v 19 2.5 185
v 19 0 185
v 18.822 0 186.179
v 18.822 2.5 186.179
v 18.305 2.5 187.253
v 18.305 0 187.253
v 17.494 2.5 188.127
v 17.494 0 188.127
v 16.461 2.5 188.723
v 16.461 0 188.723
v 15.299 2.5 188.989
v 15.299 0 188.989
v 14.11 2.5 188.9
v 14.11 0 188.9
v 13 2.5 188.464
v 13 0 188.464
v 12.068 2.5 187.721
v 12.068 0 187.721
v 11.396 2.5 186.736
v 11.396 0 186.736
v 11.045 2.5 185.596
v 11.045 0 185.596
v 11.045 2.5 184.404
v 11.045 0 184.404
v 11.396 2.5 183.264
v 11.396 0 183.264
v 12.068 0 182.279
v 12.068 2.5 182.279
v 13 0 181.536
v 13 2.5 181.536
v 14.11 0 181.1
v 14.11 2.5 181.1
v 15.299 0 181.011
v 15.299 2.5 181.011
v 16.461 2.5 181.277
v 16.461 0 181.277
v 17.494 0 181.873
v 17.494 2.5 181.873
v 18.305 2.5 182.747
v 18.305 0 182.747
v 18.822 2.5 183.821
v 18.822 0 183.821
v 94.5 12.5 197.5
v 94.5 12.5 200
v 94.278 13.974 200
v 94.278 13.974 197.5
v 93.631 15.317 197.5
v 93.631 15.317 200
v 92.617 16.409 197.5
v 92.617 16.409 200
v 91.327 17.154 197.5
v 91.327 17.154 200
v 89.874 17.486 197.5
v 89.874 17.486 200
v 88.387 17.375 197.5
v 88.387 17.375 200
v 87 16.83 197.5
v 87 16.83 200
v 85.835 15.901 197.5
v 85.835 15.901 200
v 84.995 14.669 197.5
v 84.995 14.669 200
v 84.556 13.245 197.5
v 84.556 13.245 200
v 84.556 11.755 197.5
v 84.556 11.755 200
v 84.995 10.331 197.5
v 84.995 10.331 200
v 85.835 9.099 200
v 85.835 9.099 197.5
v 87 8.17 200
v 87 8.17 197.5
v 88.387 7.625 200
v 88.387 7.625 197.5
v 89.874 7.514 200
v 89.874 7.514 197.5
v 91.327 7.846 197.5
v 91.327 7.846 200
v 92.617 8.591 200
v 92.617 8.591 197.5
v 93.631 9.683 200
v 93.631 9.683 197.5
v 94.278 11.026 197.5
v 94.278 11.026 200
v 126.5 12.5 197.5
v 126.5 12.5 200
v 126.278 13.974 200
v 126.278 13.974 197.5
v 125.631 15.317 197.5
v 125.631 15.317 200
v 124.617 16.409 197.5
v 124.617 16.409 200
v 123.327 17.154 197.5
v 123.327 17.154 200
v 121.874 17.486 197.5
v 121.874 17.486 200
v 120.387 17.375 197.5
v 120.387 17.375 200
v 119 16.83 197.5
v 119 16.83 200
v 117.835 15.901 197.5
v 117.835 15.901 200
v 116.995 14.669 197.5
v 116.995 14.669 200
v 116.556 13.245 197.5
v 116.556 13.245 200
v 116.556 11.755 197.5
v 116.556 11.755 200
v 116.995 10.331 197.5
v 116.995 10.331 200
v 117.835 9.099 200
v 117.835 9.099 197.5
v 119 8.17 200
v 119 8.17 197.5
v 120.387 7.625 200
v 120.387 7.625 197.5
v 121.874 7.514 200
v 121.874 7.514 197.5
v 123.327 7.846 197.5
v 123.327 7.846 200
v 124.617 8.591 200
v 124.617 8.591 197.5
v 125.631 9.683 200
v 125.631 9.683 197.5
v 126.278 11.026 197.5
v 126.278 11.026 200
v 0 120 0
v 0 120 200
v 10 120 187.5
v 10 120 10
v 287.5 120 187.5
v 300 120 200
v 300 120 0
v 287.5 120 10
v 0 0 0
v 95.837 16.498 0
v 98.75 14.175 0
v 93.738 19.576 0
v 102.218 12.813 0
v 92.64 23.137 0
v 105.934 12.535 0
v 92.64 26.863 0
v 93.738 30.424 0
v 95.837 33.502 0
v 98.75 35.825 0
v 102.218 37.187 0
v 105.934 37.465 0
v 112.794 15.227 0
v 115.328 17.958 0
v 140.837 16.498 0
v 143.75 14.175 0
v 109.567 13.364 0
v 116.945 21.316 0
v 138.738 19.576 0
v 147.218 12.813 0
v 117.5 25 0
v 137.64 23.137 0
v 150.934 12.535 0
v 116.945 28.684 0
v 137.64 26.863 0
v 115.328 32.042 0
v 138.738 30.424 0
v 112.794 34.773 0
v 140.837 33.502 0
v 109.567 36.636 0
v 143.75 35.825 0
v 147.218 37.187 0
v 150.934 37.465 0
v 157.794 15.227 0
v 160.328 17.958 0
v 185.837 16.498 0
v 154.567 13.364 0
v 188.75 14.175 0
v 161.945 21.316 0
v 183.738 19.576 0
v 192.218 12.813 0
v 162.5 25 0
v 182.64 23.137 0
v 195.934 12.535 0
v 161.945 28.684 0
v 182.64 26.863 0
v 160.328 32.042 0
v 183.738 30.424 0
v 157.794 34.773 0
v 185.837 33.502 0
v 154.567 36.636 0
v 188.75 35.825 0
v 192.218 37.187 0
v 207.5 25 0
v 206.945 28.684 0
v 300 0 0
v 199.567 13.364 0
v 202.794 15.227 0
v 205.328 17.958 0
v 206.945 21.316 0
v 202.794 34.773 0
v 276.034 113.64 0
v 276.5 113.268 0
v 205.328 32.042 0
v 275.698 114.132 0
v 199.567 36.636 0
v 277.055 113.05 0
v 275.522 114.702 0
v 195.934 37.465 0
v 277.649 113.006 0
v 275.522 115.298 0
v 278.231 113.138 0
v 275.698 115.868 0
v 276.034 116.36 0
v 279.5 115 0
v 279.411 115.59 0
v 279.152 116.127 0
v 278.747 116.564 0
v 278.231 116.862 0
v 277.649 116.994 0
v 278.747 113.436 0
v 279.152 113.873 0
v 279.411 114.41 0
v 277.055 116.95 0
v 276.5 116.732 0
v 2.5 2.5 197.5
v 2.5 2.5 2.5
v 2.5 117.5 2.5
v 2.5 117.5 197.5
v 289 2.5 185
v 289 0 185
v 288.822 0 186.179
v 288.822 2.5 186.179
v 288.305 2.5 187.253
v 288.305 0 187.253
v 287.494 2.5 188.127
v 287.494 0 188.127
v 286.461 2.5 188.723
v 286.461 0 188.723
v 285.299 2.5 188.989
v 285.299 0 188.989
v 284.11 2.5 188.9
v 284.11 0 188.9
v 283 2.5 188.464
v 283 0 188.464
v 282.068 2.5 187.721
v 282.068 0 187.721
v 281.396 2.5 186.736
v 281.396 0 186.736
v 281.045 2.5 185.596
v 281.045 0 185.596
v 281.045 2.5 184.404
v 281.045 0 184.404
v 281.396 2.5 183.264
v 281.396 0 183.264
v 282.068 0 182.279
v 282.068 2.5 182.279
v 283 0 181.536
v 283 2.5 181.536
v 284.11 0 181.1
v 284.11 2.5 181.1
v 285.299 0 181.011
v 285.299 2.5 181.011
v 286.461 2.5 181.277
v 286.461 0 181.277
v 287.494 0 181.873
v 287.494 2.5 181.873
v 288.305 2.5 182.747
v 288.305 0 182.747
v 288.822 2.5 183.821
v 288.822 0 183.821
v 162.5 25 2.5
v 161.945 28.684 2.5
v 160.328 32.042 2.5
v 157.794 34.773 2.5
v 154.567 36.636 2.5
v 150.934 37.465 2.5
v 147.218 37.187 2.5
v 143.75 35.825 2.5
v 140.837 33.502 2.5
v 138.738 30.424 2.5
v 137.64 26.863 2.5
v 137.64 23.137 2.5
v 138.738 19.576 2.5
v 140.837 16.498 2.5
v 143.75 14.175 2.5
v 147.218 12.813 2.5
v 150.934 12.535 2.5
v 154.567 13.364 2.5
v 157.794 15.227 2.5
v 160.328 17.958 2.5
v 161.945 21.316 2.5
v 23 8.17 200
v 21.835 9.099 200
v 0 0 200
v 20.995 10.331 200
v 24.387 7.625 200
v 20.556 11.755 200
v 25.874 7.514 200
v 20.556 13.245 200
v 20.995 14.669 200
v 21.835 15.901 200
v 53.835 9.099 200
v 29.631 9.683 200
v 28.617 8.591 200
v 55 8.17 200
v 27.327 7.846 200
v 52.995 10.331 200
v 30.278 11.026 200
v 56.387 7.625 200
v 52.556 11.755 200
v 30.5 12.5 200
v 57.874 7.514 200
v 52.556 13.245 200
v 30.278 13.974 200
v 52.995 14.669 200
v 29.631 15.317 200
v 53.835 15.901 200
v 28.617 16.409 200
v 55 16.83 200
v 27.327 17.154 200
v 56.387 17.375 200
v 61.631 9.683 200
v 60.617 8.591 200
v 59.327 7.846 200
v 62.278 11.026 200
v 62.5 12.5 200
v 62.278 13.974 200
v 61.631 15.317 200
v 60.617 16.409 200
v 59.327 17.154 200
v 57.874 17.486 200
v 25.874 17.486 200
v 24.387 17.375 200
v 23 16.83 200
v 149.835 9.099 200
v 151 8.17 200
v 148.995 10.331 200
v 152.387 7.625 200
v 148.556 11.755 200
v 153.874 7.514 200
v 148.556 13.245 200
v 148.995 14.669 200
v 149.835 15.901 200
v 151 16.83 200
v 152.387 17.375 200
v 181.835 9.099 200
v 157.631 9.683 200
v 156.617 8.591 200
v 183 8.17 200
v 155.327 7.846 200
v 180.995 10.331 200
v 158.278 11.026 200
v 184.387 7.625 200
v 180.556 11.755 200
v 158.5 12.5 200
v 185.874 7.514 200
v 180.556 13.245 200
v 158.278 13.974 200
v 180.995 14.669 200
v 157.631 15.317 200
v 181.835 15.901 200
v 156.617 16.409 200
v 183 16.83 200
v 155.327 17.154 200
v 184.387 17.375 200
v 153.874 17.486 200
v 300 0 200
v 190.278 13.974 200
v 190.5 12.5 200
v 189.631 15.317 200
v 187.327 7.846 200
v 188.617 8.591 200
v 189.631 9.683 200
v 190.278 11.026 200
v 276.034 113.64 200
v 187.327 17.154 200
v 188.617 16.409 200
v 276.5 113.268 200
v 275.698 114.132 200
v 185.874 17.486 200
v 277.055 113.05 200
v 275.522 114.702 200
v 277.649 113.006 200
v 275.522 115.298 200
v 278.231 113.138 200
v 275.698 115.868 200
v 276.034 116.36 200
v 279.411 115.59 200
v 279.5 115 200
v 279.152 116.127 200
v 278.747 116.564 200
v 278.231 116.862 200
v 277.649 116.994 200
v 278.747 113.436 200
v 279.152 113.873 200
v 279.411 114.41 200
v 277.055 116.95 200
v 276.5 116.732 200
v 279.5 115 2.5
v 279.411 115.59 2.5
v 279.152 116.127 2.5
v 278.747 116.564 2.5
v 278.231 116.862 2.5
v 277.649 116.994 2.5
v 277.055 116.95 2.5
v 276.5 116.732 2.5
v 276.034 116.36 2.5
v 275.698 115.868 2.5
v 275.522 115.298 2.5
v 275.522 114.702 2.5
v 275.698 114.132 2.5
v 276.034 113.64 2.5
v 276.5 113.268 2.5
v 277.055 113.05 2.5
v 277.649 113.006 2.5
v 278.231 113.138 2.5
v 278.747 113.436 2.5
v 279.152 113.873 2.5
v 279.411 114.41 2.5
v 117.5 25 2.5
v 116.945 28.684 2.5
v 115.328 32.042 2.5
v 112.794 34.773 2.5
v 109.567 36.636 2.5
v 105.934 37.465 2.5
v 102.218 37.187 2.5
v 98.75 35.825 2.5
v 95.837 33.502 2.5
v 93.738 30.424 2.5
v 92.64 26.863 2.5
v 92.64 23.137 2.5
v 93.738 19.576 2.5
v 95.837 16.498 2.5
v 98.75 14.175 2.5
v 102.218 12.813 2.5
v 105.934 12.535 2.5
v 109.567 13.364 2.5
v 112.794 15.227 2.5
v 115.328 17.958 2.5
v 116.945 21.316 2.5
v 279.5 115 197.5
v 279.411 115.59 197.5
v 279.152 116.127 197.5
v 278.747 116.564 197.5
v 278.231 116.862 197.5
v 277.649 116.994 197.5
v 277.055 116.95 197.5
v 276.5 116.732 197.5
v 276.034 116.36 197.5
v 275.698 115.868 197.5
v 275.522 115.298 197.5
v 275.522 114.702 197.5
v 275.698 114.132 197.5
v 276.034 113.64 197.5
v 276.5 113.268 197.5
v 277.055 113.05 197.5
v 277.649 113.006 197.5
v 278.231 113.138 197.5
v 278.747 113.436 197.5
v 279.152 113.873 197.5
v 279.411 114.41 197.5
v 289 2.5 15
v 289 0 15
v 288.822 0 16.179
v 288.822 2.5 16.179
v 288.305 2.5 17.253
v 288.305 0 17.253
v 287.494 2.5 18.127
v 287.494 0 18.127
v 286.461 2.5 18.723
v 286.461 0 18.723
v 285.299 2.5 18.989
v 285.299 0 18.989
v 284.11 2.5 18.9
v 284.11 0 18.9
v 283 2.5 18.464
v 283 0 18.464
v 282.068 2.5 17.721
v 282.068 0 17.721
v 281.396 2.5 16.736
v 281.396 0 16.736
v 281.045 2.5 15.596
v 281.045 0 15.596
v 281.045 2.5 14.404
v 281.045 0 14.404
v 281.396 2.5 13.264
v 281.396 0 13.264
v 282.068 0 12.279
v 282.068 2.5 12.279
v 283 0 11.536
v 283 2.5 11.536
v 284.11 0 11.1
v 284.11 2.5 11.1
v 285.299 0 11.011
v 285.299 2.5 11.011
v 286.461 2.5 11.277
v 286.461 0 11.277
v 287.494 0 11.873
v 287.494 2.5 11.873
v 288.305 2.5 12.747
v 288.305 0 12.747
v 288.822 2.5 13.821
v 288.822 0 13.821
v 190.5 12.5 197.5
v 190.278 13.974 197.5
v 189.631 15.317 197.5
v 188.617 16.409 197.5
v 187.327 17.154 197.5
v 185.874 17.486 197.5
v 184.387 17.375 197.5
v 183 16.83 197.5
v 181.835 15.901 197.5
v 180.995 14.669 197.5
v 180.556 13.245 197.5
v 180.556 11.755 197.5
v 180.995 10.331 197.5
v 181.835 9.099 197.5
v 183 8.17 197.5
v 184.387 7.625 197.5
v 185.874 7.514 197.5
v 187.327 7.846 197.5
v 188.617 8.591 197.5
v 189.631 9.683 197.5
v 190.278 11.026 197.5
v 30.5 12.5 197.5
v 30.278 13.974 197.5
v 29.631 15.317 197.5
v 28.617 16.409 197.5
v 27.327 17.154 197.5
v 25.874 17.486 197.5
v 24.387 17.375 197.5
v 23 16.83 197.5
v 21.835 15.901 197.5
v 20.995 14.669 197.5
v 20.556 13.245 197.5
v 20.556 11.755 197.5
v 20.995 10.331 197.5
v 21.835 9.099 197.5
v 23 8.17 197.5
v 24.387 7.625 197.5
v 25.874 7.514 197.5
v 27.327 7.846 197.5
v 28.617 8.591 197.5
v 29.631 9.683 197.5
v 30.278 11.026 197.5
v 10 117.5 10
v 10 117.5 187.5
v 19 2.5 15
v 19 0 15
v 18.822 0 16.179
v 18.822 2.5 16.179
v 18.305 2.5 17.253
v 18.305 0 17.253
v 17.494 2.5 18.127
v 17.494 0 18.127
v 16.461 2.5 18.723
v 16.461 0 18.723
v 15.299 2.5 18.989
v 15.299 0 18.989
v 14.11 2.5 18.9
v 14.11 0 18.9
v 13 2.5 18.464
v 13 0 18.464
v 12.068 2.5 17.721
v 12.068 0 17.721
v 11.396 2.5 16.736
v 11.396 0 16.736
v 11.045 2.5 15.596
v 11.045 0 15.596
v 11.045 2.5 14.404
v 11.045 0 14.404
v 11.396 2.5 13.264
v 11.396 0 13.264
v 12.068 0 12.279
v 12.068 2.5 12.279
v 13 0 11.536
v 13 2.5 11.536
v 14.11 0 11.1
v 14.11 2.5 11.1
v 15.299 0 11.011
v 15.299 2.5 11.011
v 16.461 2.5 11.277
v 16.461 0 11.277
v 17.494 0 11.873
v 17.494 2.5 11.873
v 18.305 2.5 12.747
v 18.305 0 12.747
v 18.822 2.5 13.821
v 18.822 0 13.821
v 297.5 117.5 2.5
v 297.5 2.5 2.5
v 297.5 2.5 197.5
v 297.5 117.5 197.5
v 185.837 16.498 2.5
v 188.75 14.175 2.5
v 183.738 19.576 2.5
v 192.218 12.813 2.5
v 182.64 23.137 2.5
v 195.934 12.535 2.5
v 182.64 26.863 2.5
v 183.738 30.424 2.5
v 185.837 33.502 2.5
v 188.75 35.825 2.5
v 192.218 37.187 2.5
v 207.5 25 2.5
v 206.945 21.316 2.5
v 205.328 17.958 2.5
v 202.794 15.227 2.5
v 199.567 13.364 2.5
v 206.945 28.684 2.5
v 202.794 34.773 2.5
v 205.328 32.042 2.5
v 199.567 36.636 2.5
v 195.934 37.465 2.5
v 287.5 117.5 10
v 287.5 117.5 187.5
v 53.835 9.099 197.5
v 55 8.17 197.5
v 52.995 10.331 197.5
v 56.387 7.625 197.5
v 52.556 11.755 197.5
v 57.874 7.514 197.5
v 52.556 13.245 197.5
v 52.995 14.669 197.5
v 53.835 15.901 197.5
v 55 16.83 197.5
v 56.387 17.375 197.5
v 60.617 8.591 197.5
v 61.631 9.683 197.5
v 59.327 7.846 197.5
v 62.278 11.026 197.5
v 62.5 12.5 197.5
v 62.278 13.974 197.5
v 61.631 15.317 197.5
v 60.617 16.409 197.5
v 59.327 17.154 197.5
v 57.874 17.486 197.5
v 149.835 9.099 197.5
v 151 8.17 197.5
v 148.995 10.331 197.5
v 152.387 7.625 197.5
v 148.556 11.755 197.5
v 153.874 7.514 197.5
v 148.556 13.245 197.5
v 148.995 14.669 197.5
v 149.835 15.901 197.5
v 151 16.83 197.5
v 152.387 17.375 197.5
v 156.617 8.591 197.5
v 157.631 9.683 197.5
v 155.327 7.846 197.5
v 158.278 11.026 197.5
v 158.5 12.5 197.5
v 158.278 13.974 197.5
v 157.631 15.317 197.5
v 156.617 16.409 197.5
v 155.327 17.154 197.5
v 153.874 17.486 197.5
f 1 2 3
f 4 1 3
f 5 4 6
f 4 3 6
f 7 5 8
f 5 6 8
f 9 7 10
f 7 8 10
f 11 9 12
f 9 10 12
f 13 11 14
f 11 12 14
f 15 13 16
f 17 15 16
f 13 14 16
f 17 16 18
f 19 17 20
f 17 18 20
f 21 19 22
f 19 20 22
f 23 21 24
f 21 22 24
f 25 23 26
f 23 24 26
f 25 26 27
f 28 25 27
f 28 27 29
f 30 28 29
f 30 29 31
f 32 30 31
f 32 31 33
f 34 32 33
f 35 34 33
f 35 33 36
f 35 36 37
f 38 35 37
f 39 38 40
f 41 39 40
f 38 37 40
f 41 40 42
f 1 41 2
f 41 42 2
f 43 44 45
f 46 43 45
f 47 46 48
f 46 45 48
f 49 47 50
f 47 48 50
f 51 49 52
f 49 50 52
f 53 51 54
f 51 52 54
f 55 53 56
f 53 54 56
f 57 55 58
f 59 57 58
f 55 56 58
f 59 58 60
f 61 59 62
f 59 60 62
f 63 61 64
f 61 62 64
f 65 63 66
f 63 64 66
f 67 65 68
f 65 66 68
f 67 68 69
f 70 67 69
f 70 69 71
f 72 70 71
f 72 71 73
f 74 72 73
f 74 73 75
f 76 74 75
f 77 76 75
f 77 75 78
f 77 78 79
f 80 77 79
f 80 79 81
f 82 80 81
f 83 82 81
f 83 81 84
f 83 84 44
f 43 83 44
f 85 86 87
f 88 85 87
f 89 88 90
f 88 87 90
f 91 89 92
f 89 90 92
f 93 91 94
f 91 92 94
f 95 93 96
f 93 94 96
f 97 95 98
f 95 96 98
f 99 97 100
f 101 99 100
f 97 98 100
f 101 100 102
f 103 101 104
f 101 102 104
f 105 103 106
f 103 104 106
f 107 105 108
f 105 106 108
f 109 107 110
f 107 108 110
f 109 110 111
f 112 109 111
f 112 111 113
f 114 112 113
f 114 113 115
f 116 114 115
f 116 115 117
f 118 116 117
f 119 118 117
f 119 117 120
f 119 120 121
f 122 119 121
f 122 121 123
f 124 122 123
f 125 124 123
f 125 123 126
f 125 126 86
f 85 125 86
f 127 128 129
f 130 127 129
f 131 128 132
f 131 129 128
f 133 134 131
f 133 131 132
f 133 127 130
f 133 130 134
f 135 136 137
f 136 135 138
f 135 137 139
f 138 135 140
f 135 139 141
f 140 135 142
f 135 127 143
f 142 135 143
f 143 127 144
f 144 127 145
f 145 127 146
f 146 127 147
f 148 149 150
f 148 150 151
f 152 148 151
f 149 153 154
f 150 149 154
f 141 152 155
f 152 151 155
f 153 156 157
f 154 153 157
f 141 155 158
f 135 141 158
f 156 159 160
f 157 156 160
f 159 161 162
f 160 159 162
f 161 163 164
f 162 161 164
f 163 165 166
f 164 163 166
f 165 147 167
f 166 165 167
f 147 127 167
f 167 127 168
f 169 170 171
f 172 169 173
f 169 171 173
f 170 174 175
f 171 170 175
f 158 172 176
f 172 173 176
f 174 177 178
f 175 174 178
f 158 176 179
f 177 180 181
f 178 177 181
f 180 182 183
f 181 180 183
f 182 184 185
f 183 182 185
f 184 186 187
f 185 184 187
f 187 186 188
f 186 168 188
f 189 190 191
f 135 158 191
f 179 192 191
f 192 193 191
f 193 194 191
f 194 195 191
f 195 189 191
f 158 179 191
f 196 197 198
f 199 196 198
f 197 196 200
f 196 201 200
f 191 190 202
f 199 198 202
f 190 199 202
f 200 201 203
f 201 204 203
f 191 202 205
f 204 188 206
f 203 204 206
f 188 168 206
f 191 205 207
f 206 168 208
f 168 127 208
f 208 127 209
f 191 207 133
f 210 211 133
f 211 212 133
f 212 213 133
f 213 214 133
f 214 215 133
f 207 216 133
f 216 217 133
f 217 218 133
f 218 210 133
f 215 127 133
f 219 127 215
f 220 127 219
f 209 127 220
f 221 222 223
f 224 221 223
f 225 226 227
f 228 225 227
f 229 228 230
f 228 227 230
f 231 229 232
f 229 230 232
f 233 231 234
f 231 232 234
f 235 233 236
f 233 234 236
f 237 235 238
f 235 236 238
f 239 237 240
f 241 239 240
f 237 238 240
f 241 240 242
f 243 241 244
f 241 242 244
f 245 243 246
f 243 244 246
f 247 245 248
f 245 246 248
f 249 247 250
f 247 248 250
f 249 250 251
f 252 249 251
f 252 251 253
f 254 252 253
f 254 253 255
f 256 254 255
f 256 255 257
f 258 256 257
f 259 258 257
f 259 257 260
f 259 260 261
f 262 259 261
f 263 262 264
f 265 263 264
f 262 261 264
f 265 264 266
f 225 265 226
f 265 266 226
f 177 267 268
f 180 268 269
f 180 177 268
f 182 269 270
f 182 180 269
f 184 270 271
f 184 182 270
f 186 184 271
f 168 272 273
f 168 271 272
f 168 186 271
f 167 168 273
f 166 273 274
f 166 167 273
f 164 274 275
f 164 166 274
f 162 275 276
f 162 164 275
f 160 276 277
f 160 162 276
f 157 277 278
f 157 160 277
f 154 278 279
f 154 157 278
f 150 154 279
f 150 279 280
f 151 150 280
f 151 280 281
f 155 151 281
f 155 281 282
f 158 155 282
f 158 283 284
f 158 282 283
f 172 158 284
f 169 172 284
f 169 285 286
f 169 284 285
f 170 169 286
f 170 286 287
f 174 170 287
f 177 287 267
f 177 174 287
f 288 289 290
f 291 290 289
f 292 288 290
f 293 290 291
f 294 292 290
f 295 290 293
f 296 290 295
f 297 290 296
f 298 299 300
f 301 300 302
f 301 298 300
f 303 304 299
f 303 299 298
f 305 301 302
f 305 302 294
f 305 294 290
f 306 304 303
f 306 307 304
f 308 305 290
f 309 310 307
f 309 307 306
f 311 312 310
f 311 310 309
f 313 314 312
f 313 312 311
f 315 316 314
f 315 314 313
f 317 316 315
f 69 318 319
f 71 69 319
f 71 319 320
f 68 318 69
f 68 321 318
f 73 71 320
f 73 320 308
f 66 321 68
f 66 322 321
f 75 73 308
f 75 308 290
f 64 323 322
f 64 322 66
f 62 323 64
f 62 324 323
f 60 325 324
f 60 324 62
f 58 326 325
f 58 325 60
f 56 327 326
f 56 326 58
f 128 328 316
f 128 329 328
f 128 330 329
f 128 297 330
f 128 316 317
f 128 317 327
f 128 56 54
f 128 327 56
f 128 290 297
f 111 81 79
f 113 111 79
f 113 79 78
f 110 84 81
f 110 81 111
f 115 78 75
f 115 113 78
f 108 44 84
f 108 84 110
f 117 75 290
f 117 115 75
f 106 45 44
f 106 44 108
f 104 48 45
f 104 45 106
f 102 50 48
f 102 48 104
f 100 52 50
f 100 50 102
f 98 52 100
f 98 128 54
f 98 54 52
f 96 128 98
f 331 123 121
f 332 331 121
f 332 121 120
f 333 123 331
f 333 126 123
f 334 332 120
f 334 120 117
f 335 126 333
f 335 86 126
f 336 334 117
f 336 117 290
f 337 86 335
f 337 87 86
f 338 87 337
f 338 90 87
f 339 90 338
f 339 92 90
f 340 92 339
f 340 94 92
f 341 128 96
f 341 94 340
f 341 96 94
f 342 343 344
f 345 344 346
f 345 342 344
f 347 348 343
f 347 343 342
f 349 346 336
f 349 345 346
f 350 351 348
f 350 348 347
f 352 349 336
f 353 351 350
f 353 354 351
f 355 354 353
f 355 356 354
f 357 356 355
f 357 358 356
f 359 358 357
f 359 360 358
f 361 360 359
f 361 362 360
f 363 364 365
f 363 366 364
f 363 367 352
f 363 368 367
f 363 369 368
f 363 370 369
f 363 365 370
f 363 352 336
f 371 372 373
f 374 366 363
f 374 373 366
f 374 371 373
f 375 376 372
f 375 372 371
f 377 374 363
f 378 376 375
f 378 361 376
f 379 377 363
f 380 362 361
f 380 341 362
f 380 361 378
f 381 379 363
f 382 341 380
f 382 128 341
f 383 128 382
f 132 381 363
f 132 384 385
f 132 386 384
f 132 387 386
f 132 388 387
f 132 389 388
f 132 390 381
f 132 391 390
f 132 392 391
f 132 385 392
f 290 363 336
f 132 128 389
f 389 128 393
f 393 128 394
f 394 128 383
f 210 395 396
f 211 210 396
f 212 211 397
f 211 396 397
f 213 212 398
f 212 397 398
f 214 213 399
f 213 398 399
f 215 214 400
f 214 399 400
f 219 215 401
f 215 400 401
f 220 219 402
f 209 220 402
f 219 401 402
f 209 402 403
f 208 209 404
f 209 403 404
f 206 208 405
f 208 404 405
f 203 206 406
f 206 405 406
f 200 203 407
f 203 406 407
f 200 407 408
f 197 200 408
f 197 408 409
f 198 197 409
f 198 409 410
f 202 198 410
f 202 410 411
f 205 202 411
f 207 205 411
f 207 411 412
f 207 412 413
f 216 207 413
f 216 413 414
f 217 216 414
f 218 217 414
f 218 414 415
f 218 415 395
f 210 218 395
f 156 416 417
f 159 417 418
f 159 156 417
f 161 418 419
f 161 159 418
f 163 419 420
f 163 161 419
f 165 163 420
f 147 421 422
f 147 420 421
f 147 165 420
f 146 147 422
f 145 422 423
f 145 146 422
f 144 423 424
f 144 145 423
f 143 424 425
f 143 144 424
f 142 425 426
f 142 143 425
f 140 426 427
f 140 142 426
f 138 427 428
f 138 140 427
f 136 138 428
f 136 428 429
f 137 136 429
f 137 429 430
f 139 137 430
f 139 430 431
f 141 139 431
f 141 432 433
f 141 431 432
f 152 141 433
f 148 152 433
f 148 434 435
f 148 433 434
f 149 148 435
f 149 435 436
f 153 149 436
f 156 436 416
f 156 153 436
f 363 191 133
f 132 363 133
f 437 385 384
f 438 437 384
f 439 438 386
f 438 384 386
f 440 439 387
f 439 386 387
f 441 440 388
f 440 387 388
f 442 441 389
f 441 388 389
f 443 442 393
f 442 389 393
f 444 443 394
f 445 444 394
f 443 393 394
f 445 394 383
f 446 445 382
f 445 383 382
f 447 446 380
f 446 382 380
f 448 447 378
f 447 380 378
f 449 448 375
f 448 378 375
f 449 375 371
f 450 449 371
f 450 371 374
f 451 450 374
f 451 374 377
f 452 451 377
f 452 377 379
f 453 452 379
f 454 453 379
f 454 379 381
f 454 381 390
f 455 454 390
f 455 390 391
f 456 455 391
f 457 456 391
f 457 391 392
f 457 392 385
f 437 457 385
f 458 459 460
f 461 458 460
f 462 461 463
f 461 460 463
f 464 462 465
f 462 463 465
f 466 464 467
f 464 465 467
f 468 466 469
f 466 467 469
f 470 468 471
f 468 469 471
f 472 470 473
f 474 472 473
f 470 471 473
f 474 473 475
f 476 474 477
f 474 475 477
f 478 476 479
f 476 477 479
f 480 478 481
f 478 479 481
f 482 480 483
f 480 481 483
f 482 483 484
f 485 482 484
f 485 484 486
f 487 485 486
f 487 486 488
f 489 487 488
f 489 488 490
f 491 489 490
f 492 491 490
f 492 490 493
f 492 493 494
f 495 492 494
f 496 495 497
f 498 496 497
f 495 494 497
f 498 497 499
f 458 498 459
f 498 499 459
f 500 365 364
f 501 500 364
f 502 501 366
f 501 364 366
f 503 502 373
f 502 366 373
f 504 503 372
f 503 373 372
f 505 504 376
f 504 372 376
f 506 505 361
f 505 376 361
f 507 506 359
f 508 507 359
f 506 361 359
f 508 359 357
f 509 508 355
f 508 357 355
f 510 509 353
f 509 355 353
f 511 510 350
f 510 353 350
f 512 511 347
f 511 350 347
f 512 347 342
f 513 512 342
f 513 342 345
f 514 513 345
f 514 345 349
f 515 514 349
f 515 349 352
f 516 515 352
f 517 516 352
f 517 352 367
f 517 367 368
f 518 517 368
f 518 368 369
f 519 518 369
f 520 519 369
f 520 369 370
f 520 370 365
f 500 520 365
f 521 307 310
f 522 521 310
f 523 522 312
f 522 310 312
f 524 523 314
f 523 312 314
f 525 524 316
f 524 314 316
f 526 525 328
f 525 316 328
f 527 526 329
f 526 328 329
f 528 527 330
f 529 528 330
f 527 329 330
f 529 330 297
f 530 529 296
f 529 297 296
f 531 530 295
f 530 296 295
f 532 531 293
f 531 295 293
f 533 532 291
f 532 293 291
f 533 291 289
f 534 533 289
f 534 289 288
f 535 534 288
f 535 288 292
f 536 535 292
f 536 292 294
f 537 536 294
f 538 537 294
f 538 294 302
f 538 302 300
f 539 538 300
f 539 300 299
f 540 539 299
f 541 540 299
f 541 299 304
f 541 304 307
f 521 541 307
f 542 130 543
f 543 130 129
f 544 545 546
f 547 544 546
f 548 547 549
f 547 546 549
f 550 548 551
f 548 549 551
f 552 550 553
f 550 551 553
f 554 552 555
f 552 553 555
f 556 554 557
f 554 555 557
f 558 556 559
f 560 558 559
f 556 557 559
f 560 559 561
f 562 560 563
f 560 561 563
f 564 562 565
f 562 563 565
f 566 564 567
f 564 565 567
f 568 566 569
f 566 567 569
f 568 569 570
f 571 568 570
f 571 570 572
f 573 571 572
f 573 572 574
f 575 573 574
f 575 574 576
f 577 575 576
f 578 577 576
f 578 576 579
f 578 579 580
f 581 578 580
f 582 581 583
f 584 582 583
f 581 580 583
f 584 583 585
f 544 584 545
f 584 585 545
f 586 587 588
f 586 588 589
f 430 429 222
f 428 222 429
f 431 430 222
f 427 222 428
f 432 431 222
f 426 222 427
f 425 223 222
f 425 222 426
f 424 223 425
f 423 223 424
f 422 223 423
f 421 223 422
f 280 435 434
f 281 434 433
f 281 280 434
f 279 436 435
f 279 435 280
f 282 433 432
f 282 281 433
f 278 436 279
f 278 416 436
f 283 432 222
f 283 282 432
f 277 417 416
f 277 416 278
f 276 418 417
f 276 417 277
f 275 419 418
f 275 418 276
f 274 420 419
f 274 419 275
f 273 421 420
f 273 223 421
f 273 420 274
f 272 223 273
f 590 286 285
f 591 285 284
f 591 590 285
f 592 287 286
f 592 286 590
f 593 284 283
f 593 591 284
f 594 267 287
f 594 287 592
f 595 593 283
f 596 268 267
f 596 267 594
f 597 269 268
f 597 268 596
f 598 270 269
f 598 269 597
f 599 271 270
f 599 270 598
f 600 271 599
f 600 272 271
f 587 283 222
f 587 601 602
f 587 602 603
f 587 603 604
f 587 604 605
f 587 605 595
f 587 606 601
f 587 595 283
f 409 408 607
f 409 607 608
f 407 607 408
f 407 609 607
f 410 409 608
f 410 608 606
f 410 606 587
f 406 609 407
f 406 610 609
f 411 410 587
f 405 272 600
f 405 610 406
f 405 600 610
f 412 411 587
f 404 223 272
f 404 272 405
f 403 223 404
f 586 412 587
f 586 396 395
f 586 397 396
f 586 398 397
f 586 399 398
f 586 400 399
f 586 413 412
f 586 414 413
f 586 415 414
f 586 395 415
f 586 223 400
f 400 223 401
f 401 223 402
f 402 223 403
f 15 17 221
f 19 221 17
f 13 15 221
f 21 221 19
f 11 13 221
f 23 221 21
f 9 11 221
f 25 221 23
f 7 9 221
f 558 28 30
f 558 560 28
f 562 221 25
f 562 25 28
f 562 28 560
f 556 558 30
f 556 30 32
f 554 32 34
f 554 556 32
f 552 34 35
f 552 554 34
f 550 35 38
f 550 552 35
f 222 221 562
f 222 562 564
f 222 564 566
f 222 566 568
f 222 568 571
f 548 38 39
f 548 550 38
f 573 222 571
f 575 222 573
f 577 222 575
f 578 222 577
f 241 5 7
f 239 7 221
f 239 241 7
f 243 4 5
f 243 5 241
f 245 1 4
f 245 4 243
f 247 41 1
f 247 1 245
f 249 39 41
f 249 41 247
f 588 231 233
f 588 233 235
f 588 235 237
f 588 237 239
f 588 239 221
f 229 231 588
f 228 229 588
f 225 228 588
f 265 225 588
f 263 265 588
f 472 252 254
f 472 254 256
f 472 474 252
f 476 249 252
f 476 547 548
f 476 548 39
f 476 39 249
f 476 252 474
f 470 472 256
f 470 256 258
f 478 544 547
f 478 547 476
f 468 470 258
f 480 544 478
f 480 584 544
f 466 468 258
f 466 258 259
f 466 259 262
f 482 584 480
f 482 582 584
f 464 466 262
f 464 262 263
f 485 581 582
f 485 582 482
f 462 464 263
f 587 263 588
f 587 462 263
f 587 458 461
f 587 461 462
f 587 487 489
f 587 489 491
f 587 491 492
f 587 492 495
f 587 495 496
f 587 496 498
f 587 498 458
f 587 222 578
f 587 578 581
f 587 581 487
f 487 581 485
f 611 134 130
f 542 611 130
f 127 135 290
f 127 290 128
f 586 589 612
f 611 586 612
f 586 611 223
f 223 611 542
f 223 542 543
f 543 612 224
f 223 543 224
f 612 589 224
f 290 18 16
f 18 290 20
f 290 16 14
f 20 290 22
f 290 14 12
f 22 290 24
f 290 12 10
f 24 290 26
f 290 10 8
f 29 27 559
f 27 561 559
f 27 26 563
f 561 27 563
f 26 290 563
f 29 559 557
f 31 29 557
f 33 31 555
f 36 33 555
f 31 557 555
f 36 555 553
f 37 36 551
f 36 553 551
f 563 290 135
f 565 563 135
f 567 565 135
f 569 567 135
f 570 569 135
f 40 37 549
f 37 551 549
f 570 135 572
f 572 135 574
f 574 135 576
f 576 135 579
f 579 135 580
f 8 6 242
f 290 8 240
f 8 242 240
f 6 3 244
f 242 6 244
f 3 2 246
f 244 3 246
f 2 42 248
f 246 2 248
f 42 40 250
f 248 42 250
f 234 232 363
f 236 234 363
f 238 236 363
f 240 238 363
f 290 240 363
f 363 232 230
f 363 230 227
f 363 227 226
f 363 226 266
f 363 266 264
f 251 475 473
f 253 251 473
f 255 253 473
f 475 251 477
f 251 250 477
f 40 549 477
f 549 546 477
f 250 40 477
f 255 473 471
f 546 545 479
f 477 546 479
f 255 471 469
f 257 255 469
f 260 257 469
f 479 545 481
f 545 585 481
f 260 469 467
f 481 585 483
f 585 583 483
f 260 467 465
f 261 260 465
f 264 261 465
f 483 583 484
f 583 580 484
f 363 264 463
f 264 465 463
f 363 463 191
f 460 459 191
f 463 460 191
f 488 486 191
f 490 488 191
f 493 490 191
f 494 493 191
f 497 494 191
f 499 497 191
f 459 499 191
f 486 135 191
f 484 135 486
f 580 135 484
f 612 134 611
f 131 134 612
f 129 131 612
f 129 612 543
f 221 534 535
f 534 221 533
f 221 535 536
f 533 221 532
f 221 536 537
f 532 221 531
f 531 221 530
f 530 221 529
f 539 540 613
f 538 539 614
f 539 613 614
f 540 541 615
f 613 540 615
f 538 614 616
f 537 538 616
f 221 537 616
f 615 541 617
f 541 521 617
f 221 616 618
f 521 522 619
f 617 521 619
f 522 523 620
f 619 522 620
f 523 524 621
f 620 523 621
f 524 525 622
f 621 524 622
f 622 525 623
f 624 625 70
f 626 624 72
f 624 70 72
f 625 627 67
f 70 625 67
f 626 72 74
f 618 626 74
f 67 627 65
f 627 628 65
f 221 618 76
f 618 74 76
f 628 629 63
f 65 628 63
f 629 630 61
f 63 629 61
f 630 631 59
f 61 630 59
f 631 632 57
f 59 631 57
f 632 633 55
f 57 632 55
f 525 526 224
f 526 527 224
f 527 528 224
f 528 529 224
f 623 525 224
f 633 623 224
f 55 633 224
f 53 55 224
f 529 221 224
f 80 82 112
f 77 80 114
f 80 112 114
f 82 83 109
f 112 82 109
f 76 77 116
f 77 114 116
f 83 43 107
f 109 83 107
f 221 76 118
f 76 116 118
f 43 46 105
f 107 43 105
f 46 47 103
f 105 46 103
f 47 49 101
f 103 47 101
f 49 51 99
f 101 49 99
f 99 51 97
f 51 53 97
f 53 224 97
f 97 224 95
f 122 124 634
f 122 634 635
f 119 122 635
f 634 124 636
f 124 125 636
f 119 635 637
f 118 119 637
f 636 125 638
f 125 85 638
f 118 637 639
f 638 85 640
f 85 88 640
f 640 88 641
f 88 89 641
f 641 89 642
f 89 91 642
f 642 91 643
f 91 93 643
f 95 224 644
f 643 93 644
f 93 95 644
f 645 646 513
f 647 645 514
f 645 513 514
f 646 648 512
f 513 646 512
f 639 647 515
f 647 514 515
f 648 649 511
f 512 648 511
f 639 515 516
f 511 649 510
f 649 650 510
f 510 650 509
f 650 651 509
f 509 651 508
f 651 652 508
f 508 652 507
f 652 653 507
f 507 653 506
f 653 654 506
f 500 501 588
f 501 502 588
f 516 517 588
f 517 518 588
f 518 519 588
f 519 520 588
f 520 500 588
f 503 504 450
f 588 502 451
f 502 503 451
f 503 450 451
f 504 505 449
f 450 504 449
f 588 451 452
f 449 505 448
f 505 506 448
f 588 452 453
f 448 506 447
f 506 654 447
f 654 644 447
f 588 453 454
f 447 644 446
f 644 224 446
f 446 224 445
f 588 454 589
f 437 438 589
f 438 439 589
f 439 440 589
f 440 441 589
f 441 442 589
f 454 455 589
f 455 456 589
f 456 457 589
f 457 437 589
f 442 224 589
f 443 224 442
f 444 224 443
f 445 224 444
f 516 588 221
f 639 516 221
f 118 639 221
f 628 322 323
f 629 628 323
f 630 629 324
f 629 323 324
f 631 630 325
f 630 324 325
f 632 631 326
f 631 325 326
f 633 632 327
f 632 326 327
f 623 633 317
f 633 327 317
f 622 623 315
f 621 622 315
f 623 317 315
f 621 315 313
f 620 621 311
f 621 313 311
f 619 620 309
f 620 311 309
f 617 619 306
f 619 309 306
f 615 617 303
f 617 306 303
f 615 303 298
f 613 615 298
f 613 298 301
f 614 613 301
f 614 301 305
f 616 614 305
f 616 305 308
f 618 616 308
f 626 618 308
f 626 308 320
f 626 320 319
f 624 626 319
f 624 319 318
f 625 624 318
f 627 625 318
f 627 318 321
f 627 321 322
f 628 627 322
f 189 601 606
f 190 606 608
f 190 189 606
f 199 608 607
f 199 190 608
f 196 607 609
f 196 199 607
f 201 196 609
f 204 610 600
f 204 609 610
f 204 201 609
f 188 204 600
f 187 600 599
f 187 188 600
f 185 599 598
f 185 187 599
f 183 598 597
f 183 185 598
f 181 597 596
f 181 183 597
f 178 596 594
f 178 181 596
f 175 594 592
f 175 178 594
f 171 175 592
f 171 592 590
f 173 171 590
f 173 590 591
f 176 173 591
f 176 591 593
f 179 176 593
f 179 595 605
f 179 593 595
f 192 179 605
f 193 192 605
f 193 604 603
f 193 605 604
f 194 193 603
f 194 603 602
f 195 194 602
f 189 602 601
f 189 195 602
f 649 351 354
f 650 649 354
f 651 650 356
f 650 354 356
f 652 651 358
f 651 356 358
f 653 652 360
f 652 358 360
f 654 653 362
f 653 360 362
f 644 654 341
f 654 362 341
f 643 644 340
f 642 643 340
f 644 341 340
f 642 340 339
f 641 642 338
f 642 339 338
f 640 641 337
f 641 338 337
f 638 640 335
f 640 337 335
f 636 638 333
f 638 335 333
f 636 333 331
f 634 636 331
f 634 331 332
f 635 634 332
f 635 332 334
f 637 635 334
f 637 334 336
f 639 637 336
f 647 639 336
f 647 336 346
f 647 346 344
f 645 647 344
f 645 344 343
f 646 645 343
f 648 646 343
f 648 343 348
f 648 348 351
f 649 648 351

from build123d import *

# Parameters (mm, degrees)
F0_W      = 300
F0_H      = 120
F1_DEPTH  = 200
F2_T      = -2.5
F3_W      = 297.5
F3_H      = 197.5
F3_W_2    = 277.5
F3_H_2    = 177.5
F4_DEPTH  = 2.5
F5_R      = 2
F6_DEPTH  = 200.001
F7_R      = 5
F8_DEPTH  = 5
F9_R      = 4
F10_DEPTH = 2.5
F11_R     = 12.5
F12_DEPTH = 3


with BuildPart() as f1:
    # F0 (on Top) → F1 (new body)
    with BuildSketch(Plane.XY):
        with Locations((150, 60)):
            Rectangle(F0_W, F0_H)
    extrude(amount=F1_DEPTH)

    # F2
    f2_openings = [f1.faces().sort_by_distance(p)[0] for p in [
        (150, 120, 100),
    ]]
    offset(amount=F2_T, openings=f2_openings)

    # F3 (on face) → F4 (join)
    with BuildSketch(Plane(origin=(0, 120, 0), x_dir=(-1, 0, 0), z_dir=(0, 1, 0))):
        with Locations((-148.75, 98.75)):
            Rectangle(F3_W, F3_H)
        with Locations((-148.75, 98.75)):
            Rectangle(F3_W_2, F3_H_2, mode=Mode.SUBTRACT)
    extrude(amount=-F4_DEPTH)

    # F5 (on face) → F6 (cut, through all)
    with BuildSketch(Plane.XY.offset(200)):
        with Locations((277.5, 115)):
            Circle(F5_R)
    extrude(amount=-F6_DEPTH, mode=Mode.SUBTRACT)

    # F7 (on face) → F8 (cut)
    with BuildSketch(Plane.XY.offset(200)):
        with Locations((185.5, 12.5)):
            Circle(F7_R)
        with Locations((153.5, 12.5)):
            Circle(F7_R)
        with Locations((121.5, 12.5)):
            Circle(F7_R)
        with Locations((89.5, 12.5)):
            Circle(F7_R)
        with Locations((57.5, 12.5)):
            Circle(F7_R)
        with Locations((25.5, 12.5)):
            Circle(F7_R)
    extrude(amount=-F8_DEPTH, mode=Mode.SUBTRACT)

    # F9 (on face) → F10 (cut)
    with BuildSketch(Plane.XZ):
        with Locations((285, 185)):
            Circle(F9_R)
        with Locations((285, 15)):
            Circle(F9_R)
        with Locations((15, 185)):
            Circle(F9_R)
        with Locations((15, 15)):
            Circle(F9_R)
    extrude(amount=-F10_DEPTH, mode=Mode.SUBTRACT)

    # F11 (on face) → F12 (cut)
    with BuildSketch(Plane.XY):
        with Locations((150, 25)):
            Circle(F11_R)
        with Locations((195, 25)):
            Circle(F11_R)
        with Locations((105, 25)):
            Circle(F11_R)
    extrude(amount=F12_DEPTH, mode=Mode.SUBTRACT)


solid = f1.part
